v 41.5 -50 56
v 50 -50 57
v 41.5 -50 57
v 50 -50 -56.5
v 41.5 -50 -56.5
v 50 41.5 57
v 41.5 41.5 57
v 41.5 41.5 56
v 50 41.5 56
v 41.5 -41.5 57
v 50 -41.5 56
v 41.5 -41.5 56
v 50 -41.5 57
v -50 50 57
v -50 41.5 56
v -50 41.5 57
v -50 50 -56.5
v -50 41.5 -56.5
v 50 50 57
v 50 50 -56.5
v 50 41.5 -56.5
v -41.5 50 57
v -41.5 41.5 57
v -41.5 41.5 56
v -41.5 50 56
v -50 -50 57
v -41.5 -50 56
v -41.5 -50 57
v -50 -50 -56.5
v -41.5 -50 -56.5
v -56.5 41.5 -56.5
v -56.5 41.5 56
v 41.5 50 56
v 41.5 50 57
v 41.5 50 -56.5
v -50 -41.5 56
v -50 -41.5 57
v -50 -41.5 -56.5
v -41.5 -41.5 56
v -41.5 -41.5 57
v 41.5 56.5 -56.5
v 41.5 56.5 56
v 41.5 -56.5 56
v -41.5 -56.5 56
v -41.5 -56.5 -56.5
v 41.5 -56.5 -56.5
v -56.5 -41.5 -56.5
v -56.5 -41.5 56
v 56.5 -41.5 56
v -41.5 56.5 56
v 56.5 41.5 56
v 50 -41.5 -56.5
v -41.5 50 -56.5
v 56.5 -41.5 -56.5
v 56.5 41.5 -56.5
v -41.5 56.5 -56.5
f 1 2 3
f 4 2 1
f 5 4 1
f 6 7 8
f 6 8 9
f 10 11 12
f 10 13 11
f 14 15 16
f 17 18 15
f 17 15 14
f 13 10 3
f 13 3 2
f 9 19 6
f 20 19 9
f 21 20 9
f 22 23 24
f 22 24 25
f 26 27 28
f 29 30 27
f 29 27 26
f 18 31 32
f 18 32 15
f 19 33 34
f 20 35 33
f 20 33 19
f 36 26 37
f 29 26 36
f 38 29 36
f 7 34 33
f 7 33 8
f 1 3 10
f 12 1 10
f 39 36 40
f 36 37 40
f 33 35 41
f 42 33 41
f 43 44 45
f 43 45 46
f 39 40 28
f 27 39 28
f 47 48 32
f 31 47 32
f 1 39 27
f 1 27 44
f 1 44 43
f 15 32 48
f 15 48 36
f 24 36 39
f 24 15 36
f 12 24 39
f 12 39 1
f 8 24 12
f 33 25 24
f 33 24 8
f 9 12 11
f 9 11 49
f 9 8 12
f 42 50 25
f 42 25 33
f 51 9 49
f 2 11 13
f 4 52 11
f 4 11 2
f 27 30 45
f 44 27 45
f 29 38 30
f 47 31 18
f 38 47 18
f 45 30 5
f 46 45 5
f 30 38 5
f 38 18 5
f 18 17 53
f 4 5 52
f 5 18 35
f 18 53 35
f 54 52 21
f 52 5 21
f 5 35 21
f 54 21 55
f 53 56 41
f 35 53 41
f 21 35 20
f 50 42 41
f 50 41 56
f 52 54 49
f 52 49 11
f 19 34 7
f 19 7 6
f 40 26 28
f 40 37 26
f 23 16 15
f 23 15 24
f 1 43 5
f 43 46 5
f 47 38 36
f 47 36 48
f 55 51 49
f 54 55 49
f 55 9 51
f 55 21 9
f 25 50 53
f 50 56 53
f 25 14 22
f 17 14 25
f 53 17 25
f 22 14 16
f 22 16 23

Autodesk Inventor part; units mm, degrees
ref_plane "YZ Plane" through (0, 0, 0) normal (1, 0, 0) x (0, 1, 0)
ref_plane "XZ Plane" through (0, 0, 0) normal (0, 1, 0) x (-1, 0, 0)
ref_plane "XY Plane" through (0, 0, 0) normal (0, 0, 1) x (1, 0, 0)
sketch "Sketch1" plane through (0, 0, 0) normal (0, 0, 1) x (1, 0, 0)
  line L0 (50, -50) -> (-50, -50)
  line L1 (-50, -50) -> (-50, 50)
  line L2 (-50, 50) -> (50, 50)
  line L3 (50, 50) -> (50, -50)
  line L4 (50, -50) -> (-50, 50) construction
  line L5 (-50, -50) -> (50, 50) construction
  line L6 (-50, -41.5) -> (-56.5, -41.5)
  line L7 (-56.5, -41.5) -> (-56.5, 41.5)
  line L8 (-56.5, 41.5) -> (-50, 41.5)
  line L9 (-50, 41.5) -> (-50, -41.5)
  line L10 (-41.5, 50) -> (41.5, 50)
  line L11 (41.5, 50) -> (41.5, 56.5)
  line L12 (41.5, 56.5) -> (-41.5, 56.5)
  line L13 (-41.5, 56.5) -> (-41.5, 50)
  line L14 (50, 41.5) -> (56.5, 41.5)
  line L15 (56.5, 41.5) -> (56.5, -41.5)
  line L16 (56.5, -41.5) -> (50, -41.5)
  line L17 (50, -41.5) -> (50, 41.5)
  line L18 (41.5, -50) -> (-41.5, -50)
  line L19 (-41.5, -50) -> (-41.5, -56.5)
  line L20 (-41.5, -56.5) -> (41.5, -56.5)
  line L21 (41.5, -56.5) -> (41.5, -50)
  point P0 (0, 0)
  point P1 (-50, 0)
  point P2 (0, 50)
  point P3 (50, 0)
  point P4 (0, -50)
  dimension "d0" = 100
  dimension "d1" = 6.5
  dimension "d2" = 8.5
extrude "Extrusion1" add sketch "Sketch1" along normal blind 57 and the other way blind 56.5
sketch "Sketch2" plane through (0, 0, 57) normal (0, 0, 1) x (1, 0, 0)
  line L0 (-41.5, -50) -> (-41.5, -56.5) projected
  line L1 (-41.5, -56.5) -> (41.5, -56.5) projected
  line L2 (41.5, -56.5) -> (41.5, -50) projected
  line L3 (41.5, -50) -> (50, -50) projected
  line L4 (50, -50) -> (50, -41.5) projected
  line L5 (50, -41.5) -> (56.5, -41.5) projected
  line L6 (56.5, -41.5) -> (56.5, 41.5) projected
  line L7 (56.5, 41.5) -> (50, 41.5) projected
  line L8 (50, 41.5) -> (50, 50) projected
  line L9 (50, 50) -> (41.5, 50) projected
  line L10 (41.5, 50) -> (41.5, 56.5) projected
  line L11 (41.5, 56.5) -> (-41.5, 56.5) projected
  line L12 (-41.5, 56.5) -> (-41.5, 50) projected
  line L13 (-41.5, 50) -> (-50, 50) projected
  line L14 (-50, 50) -> (-50, 41.5) projected
  line L15 (-50, 41.5) -> (-56.5, 41.5) projected
  line L16 (-56.5, 41.5) -> (-56.5, -41.5) projected
  line L17 (-56.5, -41.5) -> (-50, -41.5) projected
  line L18 (-50, -41.5) -> (-50, -50) projected
  line L19 (-50, -50) -> (-41.5, -50) projected
  line L20 (-50, -41.5) -> (-50, -50) projected
  line L21 (-50, -41.5) -> (-41.5, -41.5)
  line L22 (-41.5, -41.5) -> (-41.5, -50)
  line L23 (-50, 50) -> (-50, 41.5) projected
  line L24 (-50, 41.5) -> (-41.5, 41.5)
  line L25 (-41.5, 41.5) -> (-41.5, 50)
  line L26 (41.5, 56.5) -> (41.5, 50) projected
  line L27 (41.5, 50) -> (41.5, 41.5)
  line L28 (41.5, 41.5) -> (50, 41.5)
  line L29 (41.5, -50) -> (41.5, -41.5)
  line L30 (50, -41.5) -> (56.5, -41.5) projected
  line L31 (50, -41.5) -> (41.5, -41.5)
  point P0 (0, 0)
extrude "Extrusion2" cut sketch "Sketch2" against normal blind 1 contours L22 L21 L17 L16 L15 L24 L25 L12 L11 L10 L27 L28 L7 L6 L5 L31 L29 L2 L1 L0
sketch "Sketch3" plane through (56.5, -41.5, -56.5) normal (1, 0, 0) x (0, 0, -1)
  line L0 (-112.5, 83) -> (-112.5, 0) projected
  line L1 (0, 0) -> (-112.5, 0) projected
  line L2 (0, 83) -> (0, 0) projected
  line L3 (0, 83) -> (-112.5, 83) projected
  line L4 (-86.5, 5.25) -> (0, 5.25)
  line L5 (0, 5.25) -> (0, 77.75)
  line L6 (0, 77.75) -> (-86.5, 77.75)
  line L7 (-86.5, 77.75) -> (-86.5, 5.25)
  line L8 (0, 83) -> (0, 0) projected
  point P0 (-56.5, 41.5)
  point P1 (0, 41.5)
  dimension "d9" = 72.5
  dimension "d10" = 86.5
split_face "Split1"
sketch "Sketch4" plane through (0, 0, -56.5) normal (0, 0, -1) x (-1, 0, 0)
  line L0 (41.5, -56.5) -> (41.5, -50) projected
  line L1 (-41.5, -56.5) -> (41.5, -56.5) projected
  line L2 (-41.5, -50) -> (-41.5, -56.5) projected
  line L3 (-41.5, -41.5) -> (-41.5, -50) projected
  line L4 (-50, -41.5) -> (-41.5, -41.5) projected
  line L5 (-56.5, -41.5) -> (-50, -41.5) projected
  line L6 (-56.5, 41.5) -> (-56.5, -41.5) projected
  line L7 (-50, 41.5) -> (-56.5, 41.5) projected
  line L8 (-41.5, 41.5) -> (-50, 41.5) projected
  line L9 (-41.5, 50) -> (-41.5, 41.5) projected
  line L10 (-41.5, 56.5) -> (-41.5, 50) projected
  line L11 (41.5, 56.5) -> (-41.5, 56.5) projected
  line L12 (41.5, 50) -> (41.5, 56.5) projected
  line L13 (41.5, 41.5) -> (41.5, 50) projected
  line L14 (50, 41.5) -> (41.5, 41.5) projected
  line L15 (56.5, 41.5) -> (50, 41.5) projected
  line L16 (56.5, -41.5) -> (56.5, 41.5) projected
  line L17 (50, -41.5) -> (56.5, -41.5) projected
  line L18 (41.5, -41.5) -> (50, -41.5) projected
  line L19 (41.5, -50) -> (41.5, -41.5) projected
  point P0 (0, 0)
split_face "Split2"
properties part number "CubeSatStandard" material "Aluminum 6061"
